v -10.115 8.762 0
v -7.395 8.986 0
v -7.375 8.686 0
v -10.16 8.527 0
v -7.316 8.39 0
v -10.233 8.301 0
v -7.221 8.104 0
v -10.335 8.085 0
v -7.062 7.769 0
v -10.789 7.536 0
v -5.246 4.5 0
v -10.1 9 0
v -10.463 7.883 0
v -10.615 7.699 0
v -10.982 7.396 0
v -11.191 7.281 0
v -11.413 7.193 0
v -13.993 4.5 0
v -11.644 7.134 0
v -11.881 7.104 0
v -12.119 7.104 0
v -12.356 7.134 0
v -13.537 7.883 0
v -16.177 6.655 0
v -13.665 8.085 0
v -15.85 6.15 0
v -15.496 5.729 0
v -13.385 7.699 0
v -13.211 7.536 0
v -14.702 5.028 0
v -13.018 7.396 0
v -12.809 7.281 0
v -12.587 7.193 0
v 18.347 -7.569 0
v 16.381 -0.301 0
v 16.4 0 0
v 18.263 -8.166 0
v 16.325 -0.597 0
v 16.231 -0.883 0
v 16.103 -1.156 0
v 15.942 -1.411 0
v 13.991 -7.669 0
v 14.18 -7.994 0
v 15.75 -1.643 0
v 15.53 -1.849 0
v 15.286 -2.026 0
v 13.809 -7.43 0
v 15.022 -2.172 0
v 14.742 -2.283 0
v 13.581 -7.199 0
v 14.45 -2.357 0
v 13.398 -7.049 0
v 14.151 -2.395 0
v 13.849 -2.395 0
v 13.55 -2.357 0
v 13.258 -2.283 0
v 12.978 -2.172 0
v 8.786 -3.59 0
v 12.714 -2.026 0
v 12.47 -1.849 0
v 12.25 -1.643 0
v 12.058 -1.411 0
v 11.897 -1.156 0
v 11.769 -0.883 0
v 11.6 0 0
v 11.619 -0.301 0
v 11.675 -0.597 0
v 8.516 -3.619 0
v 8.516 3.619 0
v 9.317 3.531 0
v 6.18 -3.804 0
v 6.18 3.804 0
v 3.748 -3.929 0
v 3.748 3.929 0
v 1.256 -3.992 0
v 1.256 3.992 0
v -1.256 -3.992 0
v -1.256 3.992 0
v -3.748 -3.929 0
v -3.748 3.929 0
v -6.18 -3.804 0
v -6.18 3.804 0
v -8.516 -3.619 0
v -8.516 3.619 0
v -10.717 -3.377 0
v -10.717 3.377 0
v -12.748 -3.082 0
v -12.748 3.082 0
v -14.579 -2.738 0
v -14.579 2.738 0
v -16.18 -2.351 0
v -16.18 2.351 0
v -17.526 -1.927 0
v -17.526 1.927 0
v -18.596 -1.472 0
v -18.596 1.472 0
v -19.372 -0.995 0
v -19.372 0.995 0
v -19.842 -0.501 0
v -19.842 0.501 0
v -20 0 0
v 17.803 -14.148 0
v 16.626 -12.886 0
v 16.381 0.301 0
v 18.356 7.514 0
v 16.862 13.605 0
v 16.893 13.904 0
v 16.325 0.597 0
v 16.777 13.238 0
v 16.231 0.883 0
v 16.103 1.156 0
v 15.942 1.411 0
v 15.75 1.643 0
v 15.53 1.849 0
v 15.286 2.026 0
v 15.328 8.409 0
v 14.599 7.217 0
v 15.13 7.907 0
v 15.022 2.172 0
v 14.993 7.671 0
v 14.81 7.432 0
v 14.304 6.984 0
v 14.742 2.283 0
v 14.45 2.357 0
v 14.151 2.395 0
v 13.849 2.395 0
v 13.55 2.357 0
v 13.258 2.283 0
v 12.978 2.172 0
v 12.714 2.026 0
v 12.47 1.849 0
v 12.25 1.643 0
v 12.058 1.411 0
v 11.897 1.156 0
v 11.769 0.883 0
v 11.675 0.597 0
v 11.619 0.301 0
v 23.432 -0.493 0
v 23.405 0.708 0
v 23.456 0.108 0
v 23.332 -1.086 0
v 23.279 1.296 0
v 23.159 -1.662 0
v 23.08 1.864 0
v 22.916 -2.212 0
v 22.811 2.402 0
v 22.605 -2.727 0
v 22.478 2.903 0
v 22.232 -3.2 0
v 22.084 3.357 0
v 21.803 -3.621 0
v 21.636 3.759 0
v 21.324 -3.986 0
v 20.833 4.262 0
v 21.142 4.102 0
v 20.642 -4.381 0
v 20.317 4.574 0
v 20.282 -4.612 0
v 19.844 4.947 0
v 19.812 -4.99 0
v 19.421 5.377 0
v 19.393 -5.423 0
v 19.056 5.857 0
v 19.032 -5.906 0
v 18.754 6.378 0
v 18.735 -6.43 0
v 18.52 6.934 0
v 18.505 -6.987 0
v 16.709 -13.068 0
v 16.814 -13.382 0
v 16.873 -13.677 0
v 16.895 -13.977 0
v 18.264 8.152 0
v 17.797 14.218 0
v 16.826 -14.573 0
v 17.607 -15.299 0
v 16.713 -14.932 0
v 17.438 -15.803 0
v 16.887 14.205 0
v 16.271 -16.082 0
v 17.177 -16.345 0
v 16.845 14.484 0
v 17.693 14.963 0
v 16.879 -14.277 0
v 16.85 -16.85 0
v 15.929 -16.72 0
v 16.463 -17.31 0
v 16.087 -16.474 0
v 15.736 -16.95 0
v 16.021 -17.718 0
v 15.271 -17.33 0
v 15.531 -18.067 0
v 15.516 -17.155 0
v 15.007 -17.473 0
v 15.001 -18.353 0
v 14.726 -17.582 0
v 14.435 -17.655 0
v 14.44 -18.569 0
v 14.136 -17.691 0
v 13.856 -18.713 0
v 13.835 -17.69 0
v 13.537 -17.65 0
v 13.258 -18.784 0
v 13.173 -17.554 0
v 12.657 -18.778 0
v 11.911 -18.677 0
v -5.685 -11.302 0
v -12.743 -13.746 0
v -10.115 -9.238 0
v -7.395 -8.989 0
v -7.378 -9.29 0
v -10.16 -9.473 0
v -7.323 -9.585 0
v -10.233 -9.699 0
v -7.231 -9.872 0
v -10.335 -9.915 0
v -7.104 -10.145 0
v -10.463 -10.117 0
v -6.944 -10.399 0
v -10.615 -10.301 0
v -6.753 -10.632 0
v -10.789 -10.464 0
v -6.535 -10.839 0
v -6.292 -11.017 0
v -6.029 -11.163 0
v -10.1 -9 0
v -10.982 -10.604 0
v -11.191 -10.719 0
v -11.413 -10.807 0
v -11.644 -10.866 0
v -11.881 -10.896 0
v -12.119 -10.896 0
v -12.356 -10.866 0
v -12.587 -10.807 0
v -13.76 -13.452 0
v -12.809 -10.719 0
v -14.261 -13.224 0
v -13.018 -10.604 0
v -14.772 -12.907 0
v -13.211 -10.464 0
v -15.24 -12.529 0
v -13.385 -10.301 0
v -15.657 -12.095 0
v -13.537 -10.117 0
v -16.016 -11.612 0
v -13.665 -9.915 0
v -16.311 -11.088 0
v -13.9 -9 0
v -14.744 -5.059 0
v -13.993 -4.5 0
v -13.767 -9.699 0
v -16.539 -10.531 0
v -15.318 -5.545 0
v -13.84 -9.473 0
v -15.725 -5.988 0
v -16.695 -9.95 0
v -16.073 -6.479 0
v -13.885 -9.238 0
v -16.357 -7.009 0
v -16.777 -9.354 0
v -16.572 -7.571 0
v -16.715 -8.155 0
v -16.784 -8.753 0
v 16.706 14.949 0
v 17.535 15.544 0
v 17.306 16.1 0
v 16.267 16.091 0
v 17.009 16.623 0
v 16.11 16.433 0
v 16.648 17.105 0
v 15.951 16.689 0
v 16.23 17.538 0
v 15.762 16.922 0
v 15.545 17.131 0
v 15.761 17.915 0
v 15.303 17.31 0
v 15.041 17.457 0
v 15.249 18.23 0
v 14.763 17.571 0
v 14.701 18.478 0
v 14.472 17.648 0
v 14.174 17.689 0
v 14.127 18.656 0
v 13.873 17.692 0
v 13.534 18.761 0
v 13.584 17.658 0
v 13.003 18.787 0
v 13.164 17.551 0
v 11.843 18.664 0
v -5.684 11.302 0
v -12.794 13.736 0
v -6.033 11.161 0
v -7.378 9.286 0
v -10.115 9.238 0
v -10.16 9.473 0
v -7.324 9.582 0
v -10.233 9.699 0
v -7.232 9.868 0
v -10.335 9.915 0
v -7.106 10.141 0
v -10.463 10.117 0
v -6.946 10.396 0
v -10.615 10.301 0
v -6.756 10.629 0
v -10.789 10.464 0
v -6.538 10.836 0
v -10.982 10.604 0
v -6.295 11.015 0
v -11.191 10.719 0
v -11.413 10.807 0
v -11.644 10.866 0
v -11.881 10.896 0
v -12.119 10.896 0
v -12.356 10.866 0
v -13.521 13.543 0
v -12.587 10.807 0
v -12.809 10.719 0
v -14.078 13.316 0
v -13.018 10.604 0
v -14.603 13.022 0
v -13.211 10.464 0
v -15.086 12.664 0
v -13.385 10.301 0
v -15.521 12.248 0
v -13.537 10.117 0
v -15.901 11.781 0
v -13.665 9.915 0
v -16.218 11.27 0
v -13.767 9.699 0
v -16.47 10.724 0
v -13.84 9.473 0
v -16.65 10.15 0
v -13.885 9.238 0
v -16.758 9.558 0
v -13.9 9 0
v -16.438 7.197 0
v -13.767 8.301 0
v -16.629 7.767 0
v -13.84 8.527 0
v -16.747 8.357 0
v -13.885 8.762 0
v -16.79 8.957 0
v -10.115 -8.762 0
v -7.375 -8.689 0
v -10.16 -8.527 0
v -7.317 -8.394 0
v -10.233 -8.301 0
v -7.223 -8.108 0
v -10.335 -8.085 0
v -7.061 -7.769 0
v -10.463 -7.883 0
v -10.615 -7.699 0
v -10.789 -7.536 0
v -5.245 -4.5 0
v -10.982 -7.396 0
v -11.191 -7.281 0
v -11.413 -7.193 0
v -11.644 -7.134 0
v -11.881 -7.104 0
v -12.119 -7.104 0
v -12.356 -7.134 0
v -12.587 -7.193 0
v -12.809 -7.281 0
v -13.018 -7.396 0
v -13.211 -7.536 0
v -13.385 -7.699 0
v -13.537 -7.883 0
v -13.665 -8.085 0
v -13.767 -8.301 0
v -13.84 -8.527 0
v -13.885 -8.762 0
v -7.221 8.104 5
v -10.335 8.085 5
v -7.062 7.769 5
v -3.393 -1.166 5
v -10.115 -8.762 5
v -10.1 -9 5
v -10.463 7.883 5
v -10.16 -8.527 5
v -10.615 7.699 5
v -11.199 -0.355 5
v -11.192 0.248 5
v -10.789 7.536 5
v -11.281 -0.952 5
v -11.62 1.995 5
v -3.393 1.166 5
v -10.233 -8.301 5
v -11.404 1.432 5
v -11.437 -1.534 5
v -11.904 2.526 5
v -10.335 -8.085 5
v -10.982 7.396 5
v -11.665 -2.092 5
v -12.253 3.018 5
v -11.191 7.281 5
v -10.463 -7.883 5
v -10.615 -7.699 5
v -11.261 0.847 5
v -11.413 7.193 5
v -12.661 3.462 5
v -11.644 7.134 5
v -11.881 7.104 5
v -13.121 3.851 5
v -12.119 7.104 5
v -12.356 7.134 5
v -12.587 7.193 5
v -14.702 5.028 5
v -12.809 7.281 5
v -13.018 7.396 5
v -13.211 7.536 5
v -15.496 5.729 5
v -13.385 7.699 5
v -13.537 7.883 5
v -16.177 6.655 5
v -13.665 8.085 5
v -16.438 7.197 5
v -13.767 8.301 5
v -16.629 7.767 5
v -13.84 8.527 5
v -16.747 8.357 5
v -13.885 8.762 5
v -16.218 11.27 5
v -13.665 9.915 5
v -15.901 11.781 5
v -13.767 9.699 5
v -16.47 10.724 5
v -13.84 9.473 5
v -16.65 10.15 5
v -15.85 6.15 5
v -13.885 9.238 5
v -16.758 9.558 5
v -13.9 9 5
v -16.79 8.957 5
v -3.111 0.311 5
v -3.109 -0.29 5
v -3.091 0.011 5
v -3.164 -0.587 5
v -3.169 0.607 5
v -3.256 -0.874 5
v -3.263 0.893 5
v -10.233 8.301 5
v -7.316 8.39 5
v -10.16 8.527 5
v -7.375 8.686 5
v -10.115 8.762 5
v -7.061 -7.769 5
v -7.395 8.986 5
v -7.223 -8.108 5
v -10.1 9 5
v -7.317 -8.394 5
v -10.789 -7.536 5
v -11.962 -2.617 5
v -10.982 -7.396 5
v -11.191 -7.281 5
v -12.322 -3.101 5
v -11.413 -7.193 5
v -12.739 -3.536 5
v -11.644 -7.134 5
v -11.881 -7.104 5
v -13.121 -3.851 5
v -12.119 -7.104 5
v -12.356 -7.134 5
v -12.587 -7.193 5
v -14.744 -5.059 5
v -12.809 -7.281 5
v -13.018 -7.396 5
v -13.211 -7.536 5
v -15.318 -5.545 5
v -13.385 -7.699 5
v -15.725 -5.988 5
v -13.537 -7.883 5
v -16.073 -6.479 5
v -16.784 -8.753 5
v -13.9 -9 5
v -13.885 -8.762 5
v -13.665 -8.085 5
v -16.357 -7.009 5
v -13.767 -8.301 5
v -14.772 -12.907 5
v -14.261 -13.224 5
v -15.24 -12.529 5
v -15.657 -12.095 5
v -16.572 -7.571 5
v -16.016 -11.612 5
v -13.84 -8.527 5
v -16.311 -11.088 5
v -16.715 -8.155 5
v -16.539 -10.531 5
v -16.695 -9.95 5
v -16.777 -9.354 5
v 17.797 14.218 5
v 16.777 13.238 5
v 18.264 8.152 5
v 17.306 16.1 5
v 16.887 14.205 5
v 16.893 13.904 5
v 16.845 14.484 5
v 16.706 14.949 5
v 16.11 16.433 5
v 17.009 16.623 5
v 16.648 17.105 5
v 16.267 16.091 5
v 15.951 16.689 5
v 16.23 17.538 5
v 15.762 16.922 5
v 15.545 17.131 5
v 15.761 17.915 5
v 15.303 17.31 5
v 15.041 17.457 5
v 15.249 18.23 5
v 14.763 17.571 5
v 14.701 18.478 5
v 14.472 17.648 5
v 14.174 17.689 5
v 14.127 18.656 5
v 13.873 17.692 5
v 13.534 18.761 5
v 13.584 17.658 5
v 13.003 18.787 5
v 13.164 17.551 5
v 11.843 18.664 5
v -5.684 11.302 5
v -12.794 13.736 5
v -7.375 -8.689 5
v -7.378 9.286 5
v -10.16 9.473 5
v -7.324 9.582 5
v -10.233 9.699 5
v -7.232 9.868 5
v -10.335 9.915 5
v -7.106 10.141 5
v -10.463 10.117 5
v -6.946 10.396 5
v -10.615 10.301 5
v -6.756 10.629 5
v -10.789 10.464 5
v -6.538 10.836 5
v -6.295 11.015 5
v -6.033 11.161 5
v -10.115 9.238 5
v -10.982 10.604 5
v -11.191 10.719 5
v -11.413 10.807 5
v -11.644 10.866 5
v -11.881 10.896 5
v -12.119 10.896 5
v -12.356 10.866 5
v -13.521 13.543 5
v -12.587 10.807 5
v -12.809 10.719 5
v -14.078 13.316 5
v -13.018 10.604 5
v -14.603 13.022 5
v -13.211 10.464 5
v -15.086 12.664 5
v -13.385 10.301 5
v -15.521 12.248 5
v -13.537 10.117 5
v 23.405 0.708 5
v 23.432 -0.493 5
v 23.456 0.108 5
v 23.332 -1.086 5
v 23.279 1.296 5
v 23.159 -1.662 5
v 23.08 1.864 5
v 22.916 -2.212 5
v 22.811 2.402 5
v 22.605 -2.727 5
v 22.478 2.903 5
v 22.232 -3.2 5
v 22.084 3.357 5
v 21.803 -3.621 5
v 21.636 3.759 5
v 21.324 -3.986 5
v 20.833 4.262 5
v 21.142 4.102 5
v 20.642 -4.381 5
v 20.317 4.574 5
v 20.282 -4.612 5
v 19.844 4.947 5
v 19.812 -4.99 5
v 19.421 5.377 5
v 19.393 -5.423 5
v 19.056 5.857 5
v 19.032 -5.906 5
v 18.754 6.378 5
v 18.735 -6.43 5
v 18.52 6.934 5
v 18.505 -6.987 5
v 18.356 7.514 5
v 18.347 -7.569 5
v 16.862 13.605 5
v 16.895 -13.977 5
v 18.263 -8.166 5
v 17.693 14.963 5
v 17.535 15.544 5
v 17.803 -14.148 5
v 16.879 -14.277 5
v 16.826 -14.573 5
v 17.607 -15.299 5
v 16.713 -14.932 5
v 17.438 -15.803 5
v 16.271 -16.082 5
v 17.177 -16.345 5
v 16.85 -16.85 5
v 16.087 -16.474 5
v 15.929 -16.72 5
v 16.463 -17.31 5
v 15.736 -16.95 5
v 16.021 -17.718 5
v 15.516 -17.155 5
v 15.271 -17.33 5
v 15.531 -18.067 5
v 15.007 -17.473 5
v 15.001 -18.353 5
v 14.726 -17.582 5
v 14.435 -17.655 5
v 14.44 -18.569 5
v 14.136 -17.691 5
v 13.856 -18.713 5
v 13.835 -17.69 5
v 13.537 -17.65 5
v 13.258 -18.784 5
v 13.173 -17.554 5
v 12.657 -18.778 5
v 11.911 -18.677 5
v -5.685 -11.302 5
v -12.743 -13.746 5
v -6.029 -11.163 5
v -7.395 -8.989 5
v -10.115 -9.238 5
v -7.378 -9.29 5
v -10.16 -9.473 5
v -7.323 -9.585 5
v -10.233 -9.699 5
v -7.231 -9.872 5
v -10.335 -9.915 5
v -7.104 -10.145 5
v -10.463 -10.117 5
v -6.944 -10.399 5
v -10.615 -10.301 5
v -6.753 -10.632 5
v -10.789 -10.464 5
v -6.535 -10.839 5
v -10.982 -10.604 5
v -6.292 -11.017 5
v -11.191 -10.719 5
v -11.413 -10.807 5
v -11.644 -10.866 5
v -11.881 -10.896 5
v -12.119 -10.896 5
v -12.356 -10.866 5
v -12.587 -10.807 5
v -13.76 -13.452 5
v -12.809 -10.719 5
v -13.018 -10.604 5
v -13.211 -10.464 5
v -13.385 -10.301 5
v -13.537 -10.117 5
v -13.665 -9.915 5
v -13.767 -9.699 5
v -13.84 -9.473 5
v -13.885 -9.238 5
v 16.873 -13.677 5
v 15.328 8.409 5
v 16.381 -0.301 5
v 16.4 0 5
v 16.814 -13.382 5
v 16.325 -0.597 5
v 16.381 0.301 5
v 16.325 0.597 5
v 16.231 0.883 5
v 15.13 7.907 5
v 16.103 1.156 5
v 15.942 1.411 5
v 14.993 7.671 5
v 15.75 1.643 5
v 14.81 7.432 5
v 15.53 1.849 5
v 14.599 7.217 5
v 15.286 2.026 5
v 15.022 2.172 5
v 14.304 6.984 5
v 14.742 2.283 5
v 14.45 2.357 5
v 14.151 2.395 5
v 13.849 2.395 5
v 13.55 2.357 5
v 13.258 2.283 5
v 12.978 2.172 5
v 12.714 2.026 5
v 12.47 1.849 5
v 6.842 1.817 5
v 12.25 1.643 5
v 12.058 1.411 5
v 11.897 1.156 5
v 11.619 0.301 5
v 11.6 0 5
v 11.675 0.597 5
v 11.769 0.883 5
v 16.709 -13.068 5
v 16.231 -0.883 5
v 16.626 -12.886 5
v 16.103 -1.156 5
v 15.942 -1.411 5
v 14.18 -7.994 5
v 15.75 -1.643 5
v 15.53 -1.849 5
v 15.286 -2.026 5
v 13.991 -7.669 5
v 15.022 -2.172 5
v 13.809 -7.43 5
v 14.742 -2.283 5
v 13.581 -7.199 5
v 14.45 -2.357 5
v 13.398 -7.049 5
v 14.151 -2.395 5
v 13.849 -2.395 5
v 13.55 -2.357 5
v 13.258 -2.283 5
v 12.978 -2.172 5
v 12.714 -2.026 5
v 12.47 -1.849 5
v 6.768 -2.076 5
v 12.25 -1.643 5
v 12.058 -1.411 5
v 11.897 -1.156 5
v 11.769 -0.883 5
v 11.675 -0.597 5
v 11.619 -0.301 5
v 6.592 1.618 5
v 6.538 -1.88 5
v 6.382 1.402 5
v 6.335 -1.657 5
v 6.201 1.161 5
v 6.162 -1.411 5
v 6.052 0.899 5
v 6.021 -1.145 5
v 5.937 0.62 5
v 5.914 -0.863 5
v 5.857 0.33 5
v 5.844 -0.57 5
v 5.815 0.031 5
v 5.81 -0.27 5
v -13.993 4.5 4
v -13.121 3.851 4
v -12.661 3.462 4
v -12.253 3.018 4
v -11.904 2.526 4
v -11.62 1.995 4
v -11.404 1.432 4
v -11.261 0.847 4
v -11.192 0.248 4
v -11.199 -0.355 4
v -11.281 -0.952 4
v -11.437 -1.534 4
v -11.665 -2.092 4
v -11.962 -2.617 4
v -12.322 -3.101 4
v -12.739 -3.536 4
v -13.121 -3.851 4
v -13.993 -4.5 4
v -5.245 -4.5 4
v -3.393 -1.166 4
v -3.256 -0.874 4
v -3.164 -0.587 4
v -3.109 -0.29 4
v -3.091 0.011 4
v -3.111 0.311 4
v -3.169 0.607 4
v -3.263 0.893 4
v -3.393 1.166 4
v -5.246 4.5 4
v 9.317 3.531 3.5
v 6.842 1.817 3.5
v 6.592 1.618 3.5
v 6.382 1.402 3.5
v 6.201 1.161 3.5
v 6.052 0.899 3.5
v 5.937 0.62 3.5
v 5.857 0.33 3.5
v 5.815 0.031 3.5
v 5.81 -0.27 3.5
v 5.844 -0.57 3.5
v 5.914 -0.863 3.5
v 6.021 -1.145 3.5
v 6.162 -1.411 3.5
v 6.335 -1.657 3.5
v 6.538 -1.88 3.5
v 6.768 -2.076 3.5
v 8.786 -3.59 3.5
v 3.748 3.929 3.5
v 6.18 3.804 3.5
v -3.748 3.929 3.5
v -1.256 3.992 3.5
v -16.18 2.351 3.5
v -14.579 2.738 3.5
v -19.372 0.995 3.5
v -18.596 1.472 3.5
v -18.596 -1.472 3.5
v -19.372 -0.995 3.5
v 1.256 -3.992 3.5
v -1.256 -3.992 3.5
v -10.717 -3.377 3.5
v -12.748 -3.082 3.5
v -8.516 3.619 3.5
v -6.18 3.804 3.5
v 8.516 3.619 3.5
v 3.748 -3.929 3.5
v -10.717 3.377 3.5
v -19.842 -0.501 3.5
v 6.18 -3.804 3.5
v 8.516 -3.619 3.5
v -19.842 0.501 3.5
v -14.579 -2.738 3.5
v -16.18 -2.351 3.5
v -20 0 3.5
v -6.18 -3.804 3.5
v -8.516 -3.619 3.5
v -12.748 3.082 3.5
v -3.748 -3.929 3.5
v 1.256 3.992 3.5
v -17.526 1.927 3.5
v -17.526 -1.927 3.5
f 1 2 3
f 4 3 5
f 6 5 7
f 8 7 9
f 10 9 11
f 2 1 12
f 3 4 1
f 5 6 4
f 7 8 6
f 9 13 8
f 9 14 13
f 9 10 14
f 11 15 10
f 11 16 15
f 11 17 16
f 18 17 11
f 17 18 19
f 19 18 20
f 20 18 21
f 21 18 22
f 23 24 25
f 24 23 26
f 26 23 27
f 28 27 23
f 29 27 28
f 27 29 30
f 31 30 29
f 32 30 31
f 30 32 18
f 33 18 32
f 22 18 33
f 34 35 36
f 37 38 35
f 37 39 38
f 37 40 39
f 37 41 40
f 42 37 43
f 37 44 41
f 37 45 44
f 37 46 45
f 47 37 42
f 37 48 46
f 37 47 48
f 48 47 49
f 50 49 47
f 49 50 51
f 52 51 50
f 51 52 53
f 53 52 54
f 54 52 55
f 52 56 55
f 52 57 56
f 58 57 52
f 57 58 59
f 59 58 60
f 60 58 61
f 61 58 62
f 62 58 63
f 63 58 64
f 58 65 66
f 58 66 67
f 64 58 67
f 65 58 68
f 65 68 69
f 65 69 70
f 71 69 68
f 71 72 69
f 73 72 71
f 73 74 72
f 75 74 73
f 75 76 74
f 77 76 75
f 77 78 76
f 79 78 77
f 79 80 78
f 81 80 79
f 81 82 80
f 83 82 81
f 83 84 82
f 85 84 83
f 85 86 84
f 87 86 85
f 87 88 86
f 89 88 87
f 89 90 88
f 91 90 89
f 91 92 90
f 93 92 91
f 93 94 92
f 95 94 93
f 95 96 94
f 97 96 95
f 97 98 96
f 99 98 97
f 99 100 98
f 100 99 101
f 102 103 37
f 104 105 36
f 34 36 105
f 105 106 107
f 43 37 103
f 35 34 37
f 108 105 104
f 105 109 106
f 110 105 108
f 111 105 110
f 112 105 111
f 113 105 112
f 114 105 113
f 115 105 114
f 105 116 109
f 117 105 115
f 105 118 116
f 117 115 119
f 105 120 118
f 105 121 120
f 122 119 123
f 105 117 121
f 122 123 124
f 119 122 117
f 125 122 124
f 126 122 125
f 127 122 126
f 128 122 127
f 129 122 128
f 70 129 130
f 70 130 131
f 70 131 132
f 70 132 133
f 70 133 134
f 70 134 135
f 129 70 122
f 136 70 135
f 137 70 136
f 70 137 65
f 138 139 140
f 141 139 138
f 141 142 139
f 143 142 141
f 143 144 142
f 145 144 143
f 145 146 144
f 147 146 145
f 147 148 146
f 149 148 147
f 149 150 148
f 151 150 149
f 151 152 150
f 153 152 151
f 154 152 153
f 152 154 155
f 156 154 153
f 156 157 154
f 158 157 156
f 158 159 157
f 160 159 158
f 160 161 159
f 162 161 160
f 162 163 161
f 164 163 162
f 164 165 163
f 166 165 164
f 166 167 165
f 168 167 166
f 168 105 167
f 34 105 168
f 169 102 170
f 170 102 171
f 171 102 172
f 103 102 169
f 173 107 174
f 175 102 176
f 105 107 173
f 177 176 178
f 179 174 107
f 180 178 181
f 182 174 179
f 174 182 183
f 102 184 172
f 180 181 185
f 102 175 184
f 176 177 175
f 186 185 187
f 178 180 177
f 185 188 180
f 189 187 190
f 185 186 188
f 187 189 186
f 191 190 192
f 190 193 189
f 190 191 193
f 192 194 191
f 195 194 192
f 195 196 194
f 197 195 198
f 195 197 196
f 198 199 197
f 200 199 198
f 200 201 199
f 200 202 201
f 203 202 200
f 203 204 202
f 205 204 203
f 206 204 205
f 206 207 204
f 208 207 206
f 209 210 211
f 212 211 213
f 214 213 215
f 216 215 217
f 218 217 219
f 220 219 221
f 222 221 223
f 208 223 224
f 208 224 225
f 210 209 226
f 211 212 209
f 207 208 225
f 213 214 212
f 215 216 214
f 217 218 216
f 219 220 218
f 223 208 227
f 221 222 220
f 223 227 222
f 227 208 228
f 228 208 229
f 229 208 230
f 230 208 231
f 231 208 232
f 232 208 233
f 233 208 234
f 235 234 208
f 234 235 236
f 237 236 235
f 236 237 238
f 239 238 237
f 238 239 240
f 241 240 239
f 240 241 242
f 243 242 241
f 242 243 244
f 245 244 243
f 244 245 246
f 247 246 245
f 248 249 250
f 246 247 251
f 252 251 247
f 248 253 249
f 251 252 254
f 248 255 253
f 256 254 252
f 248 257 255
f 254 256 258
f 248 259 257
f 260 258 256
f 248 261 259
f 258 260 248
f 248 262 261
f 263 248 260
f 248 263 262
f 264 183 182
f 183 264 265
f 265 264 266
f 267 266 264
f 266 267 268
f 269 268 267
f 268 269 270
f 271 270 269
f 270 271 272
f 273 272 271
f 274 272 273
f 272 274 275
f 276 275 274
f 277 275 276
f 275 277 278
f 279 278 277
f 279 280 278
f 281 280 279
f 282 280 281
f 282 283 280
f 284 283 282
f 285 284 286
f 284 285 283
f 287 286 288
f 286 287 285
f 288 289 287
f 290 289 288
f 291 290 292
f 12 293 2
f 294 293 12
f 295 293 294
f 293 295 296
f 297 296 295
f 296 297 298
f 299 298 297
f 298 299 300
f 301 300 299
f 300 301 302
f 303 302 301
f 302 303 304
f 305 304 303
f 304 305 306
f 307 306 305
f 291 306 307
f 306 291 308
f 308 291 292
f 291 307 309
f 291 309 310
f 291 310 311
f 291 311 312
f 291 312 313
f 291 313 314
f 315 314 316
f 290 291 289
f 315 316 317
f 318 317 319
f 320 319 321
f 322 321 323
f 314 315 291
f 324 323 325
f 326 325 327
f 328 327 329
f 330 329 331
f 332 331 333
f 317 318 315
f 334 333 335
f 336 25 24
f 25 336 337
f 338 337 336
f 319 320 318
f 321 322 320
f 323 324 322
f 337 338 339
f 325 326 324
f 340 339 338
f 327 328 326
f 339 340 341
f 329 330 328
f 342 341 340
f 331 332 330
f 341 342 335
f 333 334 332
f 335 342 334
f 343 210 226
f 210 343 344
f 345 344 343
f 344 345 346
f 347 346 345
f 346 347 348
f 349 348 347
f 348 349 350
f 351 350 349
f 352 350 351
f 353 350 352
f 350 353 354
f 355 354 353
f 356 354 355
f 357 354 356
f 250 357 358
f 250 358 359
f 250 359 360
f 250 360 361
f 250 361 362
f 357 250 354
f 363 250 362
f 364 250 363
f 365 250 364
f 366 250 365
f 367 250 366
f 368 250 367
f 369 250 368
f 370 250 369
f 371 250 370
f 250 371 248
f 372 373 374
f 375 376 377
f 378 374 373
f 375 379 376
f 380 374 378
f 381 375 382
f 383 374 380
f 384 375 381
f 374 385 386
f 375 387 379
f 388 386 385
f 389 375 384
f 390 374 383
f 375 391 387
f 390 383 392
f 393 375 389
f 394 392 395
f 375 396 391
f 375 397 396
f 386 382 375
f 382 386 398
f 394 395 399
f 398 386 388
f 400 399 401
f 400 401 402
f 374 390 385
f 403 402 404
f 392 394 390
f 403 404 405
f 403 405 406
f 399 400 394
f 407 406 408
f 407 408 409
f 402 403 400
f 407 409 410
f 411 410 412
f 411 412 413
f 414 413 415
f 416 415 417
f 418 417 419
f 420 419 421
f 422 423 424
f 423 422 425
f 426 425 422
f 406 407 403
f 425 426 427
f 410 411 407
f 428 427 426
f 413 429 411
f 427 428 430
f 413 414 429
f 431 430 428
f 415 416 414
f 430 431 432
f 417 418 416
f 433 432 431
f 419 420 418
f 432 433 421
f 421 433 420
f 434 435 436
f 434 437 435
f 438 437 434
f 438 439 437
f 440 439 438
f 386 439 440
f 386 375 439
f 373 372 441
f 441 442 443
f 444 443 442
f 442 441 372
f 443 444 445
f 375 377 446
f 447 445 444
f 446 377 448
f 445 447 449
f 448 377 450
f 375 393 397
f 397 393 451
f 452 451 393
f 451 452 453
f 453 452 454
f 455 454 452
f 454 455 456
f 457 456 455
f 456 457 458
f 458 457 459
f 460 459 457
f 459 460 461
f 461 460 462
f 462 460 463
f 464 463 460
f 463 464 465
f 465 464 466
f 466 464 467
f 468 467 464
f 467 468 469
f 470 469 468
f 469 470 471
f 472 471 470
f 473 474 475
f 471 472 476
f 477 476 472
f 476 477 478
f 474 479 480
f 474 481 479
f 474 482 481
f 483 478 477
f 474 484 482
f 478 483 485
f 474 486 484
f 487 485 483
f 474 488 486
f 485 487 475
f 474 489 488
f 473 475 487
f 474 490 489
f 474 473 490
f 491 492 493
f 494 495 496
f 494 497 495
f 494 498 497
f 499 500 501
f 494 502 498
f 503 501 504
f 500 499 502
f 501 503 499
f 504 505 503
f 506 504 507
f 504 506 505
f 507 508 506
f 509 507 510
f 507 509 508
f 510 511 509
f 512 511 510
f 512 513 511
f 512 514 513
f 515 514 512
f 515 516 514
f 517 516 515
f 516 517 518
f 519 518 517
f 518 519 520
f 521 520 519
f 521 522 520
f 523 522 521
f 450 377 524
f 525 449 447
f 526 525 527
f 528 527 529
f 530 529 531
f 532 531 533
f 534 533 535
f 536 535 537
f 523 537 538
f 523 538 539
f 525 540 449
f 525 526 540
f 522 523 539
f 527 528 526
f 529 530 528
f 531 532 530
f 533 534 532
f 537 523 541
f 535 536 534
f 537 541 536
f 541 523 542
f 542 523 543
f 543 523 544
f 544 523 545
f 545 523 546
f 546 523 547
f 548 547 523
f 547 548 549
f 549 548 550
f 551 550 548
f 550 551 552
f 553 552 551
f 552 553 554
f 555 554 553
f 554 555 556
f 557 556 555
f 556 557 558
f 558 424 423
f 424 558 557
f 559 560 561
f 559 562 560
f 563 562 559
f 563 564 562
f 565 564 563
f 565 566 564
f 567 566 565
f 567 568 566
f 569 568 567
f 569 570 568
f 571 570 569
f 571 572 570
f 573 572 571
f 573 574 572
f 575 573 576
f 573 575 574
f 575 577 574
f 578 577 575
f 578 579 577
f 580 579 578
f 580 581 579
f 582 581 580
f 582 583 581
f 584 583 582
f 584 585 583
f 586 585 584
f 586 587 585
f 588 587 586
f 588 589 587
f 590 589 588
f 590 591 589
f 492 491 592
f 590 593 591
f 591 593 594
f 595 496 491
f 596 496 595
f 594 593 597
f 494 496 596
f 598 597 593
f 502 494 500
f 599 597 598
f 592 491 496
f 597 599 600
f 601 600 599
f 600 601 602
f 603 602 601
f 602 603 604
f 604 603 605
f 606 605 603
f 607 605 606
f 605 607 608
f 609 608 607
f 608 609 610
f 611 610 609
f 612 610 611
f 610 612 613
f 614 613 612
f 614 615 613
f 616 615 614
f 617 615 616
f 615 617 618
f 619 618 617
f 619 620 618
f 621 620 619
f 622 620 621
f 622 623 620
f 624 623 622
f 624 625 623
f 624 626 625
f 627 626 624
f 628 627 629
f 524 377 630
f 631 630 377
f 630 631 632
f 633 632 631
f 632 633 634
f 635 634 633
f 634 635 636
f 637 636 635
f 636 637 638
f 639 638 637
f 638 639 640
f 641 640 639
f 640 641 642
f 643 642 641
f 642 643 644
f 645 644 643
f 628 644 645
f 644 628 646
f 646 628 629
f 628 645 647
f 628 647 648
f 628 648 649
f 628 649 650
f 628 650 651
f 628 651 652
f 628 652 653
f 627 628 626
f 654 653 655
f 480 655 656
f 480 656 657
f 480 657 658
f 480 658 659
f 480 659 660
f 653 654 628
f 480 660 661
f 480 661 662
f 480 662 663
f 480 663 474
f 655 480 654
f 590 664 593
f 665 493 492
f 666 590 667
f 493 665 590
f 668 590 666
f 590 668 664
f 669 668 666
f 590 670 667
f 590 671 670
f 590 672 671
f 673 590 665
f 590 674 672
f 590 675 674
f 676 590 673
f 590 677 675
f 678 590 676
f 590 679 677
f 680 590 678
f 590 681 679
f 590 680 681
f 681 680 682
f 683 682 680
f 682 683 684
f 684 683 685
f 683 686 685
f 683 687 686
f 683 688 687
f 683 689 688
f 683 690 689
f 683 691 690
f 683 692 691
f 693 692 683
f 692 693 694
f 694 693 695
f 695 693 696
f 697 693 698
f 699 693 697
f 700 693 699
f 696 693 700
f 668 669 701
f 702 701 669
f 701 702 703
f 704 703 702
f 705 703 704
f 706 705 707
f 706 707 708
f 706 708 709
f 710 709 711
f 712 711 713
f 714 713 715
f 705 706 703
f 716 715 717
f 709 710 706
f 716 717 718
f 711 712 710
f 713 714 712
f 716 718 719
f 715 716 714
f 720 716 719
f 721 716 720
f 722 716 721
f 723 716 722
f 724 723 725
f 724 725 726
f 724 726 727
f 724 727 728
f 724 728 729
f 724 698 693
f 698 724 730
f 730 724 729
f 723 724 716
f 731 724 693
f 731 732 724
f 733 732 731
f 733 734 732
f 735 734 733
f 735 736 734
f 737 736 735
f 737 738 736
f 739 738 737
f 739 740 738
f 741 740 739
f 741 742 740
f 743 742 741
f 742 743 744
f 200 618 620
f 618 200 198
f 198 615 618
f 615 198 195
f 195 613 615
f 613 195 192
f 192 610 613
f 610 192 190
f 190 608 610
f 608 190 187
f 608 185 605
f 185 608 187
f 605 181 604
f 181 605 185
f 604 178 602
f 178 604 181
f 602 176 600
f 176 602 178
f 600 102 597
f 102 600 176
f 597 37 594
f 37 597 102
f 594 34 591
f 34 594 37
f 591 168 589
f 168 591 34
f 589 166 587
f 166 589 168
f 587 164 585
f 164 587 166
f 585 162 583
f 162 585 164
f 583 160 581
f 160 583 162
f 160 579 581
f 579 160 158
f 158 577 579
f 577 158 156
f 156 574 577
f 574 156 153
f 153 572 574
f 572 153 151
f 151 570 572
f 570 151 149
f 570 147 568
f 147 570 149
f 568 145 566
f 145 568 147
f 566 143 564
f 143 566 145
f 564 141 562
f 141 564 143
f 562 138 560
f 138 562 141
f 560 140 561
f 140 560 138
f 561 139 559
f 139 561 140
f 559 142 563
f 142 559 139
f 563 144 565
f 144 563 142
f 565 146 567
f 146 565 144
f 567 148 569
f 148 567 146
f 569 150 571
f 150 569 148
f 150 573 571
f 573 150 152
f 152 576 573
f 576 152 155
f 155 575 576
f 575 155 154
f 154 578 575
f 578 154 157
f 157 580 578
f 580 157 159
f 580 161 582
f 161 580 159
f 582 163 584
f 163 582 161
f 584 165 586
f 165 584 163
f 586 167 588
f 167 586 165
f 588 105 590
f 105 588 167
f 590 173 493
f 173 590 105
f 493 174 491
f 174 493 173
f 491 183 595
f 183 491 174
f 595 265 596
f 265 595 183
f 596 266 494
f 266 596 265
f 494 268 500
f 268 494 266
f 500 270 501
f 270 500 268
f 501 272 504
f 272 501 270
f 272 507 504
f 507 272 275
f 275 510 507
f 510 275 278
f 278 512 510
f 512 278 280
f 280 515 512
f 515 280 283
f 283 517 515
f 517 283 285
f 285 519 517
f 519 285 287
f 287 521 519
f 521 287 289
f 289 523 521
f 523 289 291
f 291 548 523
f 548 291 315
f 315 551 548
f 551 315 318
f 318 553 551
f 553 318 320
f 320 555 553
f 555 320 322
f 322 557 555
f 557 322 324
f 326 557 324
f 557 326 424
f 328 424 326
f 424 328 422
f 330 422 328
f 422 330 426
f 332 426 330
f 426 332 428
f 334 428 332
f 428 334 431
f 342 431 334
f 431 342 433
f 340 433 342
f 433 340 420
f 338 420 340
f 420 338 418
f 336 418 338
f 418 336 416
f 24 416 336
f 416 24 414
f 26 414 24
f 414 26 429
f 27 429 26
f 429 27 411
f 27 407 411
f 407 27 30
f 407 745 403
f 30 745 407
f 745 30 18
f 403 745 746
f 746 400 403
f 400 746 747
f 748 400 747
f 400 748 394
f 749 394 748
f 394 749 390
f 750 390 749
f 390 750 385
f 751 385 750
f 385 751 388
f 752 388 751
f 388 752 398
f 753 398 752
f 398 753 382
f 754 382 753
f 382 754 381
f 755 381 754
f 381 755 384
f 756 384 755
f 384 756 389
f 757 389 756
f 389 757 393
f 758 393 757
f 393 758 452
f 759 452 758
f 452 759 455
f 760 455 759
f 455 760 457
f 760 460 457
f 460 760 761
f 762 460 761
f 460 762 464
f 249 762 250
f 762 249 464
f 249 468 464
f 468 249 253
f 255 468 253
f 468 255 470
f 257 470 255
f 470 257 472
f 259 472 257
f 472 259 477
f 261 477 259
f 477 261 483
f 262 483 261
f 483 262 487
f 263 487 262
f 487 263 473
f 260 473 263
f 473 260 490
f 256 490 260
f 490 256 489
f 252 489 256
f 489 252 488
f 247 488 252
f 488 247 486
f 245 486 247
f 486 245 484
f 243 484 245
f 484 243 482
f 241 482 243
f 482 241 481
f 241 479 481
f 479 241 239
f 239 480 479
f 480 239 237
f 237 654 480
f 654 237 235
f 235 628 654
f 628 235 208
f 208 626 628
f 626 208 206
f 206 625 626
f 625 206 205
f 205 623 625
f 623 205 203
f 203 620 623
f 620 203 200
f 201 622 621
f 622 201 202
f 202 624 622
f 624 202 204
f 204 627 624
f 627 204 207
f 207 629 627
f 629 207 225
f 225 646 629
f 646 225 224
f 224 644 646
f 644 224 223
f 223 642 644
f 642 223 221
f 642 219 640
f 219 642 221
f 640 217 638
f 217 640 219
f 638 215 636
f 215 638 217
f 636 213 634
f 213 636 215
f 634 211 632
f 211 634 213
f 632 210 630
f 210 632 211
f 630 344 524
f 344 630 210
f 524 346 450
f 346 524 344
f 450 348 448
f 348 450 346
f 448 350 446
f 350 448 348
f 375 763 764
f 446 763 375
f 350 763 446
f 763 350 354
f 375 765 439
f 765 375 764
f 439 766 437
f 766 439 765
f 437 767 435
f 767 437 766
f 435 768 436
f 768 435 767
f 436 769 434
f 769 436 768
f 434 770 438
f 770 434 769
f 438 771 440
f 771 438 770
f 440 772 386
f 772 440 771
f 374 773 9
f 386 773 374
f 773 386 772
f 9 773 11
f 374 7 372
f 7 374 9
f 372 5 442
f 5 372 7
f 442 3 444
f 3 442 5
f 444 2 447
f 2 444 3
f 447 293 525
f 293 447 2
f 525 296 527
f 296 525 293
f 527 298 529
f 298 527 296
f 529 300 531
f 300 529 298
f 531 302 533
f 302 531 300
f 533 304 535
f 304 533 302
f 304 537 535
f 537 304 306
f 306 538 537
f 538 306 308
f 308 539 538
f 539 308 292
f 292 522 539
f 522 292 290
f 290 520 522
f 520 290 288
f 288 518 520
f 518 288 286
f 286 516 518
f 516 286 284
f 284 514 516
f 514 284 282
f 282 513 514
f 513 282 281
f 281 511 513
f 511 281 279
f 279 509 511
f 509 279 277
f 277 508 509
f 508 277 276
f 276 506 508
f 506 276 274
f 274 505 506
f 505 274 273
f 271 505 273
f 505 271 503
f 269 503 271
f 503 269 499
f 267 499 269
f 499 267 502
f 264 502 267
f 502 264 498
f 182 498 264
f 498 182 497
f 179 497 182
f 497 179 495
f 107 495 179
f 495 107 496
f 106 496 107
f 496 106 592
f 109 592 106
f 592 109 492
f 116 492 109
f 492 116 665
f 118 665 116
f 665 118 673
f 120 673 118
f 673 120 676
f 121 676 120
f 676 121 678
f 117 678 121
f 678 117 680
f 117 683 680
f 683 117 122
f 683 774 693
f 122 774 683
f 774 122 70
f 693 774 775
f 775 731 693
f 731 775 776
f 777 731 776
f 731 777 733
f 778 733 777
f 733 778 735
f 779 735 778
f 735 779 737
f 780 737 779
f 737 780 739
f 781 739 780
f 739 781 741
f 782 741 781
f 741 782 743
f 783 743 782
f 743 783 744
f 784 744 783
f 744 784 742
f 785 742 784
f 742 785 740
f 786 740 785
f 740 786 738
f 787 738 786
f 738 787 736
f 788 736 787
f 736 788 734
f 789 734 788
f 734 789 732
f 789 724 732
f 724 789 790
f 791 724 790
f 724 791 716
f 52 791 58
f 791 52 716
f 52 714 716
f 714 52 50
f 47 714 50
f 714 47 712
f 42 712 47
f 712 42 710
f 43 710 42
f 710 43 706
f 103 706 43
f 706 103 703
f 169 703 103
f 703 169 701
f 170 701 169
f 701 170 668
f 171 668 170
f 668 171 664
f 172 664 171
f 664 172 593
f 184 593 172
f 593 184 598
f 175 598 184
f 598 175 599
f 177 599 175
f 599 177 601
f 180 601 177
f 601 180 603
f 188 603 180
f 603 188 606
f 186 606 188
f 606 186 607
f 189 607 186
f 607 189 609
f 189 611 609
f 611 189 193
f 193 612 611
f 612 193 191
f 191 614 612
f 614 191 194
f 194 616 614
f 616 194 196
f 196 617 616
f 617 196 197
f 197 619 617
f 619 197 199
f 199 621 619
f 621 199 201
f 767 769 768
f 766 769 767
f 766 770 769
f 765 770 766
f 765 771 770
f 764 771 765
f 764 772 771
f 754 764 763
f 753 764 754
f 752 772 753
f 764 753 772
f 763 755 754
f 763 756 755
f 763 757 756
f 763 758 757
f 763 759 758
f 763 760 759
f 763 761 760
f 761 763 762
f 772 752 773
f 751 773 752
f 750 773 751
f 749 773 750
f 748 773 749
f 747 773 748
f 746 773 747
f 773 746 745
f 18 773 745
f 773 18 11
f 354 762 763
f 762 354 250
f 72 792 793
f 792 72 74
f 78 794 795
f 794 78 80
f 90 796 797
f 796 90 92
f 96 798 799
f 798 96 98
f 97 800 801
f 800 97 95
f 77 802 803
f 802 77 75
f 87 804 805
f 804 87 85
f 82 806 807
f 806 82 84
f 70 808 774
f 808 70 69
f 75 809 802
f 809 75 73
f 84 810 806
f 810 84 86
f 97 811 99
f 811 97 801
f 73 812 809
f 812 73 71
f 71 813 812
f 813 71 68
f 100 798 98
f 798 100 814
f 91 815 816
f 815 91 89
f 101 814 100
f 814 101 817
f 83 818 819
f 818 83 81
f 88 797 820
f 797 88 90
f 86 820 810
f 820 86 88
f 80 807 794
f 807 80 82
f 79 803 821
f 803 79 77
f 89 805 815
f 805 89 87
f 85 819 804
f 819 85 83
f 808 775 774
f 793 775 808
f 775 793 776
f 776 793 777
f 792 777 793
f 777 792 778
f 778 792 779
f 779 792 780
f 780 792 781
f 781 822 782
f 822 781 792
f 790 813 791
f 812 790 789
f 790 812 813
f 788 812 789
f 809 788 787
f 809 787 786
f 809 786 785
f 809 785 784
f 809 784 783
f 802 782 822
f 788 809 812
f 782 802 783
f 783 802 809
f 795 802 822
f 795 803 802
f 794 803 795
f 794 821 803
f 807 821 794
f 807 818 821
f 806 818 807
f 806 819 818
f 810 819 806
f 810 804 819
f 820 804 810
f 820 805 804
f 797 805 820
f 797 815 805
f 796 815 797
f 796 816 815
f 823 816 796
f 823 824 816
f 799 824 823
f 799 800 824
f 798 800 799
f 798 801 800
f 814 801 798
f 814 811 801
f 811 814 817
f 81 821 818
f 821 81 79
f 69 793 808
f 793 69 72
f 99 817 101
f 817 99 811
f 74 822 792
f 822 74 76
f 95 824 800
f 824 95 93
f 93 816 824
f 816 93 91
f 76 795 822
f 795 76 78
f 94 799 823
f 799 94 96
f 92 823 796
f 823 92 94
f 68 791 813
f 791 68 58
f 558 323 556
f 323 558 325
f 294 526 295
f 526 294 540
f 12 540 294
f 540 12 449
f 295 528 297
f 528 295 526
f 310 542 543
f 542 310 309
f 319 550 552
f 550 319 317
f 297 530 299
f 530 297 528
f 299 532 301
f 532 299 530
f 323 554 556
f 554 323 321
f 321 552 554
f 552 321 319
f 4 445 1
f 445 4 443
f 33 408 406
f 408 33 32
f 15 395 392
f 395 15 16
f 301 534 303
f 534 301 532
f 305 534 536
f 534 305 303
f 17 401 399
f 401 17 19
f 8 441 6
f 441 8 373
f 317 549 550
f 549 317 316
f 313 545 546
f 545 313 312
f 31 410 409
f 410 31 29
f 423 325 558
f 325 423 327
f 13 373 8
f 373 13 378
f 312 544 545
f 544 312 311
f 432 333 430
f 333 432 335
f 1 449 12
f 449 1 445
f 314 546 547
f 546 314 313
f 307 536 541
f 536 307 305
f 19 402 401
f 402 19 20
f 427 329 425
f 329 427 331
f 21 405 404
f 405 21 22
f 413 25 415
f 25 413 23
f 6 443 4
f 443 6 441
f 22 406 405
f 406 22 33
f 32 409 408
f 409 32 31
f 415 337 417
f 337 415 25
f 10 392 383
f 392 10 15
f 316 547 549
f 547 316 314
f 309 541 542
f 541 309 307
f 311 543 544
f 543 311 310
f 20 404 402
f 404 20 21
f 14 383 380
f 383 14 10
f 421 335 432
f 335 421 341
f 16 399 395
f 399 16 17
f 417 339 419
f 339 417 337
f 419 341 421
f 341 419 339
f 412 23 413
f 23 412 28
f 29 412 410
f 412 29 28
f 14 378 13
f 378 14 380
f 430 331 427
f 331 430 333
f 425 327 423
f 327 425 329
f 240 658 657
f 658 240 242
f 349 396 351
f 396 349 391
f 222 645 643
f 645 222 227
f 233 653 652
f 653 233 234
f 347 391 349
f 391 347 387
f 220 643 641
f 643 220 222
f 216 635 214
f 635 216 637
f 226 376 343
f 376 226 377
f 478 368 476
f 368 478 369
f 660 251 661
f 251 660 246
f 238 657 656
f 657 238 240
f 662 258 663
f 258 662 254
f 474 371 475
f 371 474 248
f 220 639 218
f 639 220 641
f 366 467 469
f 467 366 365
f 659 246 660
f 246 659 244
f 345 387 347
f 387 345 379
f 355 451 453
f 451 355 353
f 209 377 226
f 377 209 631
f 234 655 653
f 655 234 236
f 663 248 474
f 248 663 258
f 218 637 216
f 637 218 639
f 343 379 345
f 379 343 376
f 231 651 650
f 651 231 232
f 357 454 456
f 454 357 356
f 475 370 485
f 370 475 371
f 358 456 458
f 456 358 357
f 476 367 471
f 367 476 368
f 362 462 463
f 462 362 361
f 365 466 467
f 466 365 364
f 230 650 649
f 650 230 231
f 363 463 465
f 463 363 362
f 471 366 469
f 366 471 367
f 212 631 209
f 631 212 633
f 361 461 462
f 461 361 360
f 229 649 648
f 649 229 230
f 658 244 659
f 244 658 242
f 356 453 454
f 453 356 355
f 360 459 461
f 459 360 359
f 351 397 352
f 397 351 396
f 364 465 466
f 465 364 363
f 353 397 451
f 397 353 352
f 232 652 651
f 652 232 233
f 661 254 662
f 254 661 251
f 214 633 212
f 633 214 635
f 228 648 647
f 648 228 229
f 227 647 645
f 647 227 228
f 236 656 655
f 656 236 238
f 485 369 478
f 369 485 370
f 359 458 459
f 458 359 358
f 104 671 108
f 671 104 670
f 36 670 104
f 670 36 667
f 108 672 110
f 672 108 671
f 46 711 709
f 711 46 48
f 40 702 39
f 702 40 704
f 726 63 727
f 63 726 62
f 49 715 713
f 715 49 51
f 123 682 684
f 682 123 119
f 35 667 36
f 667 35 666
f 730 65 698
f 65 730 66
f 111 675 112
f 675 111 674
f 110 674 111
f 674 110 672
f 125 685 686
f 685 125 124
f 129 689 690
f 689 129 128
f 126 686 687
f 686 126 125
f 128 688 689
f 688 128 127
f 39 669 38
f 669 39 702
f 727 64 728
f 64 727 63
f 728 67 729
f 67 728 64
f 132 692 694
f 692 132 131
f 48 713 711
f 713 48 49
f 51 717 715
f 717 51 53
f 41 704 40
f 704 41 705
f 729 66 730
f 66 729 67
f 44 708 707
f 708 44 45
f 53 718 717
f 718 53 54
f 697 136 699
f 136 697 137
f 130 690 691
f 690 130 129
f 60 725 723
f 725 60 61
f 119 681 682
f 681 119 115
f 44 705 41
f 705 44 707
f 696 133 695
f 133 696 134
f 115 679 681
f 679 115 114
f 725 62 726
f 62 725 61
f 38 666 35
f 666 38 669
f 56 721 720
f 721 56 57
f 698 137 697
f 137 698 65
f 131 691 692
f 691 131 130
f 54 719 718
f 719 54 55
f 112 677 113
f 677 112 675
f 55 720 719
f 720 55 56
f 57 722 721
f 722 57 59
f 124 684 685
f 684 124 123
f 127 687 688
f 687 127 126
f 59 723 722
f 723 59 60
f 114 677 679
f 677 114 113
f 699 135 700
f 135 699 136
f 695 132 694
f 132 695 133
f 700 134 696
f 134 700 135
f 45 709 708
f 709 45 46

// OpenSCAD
radius1=1.9;
radius2=2.4;
miny=-9;
maxy=9;
minx=-12;
maxx=13;

height=5;

bearingx=14;

off=minx+(maxx-minx)*2/3;
$fn=50+0;

difference() {
  union() {
    difference() {
    linear_extrude(height=height)
     difference() {
     offset(r=-2*radius2)
      offset(r=4*radius2)
        polygon(
          [
           [maxx,miny-5],
           [bearingx,-1],
           [bearingx/3*4,0],
           [bearingx,1],
           [maxx,maxy+5],
           [minx,maxy],
           [.1,0],
           [minx,miny],
          ]
          );
    
      offset(r=-radius2)
       offset(r=2*radius2)
        polygon([
                [bearingx,miny-6.3],
                [bearingx+.5,miny-5],
                [bearingx-2,miny],
                [0,0],
                [bearingx-1,maxy],
                [bearingx+.5,maxy+5],
                [bearingx,maxy+6.3],
                [-5,9],
                [0,0],
                [-5,-9],
                ]);
    
     }
    translate([-15,0,(height-1)/2])
      cube([30,9,height-1], center=true);
    }
    #scale([5,1,1])
      cylinder(r=4, h=height-1.5);
  }
  translate([minx,maxy,0])
   cylinder(r=radius1, h=height);
  translate([minx,miny,0])
   cylinder(r=radius1, h=height);

  translate([bearingx,0,0])
   cylinder(r=radius2, h=height);
}
